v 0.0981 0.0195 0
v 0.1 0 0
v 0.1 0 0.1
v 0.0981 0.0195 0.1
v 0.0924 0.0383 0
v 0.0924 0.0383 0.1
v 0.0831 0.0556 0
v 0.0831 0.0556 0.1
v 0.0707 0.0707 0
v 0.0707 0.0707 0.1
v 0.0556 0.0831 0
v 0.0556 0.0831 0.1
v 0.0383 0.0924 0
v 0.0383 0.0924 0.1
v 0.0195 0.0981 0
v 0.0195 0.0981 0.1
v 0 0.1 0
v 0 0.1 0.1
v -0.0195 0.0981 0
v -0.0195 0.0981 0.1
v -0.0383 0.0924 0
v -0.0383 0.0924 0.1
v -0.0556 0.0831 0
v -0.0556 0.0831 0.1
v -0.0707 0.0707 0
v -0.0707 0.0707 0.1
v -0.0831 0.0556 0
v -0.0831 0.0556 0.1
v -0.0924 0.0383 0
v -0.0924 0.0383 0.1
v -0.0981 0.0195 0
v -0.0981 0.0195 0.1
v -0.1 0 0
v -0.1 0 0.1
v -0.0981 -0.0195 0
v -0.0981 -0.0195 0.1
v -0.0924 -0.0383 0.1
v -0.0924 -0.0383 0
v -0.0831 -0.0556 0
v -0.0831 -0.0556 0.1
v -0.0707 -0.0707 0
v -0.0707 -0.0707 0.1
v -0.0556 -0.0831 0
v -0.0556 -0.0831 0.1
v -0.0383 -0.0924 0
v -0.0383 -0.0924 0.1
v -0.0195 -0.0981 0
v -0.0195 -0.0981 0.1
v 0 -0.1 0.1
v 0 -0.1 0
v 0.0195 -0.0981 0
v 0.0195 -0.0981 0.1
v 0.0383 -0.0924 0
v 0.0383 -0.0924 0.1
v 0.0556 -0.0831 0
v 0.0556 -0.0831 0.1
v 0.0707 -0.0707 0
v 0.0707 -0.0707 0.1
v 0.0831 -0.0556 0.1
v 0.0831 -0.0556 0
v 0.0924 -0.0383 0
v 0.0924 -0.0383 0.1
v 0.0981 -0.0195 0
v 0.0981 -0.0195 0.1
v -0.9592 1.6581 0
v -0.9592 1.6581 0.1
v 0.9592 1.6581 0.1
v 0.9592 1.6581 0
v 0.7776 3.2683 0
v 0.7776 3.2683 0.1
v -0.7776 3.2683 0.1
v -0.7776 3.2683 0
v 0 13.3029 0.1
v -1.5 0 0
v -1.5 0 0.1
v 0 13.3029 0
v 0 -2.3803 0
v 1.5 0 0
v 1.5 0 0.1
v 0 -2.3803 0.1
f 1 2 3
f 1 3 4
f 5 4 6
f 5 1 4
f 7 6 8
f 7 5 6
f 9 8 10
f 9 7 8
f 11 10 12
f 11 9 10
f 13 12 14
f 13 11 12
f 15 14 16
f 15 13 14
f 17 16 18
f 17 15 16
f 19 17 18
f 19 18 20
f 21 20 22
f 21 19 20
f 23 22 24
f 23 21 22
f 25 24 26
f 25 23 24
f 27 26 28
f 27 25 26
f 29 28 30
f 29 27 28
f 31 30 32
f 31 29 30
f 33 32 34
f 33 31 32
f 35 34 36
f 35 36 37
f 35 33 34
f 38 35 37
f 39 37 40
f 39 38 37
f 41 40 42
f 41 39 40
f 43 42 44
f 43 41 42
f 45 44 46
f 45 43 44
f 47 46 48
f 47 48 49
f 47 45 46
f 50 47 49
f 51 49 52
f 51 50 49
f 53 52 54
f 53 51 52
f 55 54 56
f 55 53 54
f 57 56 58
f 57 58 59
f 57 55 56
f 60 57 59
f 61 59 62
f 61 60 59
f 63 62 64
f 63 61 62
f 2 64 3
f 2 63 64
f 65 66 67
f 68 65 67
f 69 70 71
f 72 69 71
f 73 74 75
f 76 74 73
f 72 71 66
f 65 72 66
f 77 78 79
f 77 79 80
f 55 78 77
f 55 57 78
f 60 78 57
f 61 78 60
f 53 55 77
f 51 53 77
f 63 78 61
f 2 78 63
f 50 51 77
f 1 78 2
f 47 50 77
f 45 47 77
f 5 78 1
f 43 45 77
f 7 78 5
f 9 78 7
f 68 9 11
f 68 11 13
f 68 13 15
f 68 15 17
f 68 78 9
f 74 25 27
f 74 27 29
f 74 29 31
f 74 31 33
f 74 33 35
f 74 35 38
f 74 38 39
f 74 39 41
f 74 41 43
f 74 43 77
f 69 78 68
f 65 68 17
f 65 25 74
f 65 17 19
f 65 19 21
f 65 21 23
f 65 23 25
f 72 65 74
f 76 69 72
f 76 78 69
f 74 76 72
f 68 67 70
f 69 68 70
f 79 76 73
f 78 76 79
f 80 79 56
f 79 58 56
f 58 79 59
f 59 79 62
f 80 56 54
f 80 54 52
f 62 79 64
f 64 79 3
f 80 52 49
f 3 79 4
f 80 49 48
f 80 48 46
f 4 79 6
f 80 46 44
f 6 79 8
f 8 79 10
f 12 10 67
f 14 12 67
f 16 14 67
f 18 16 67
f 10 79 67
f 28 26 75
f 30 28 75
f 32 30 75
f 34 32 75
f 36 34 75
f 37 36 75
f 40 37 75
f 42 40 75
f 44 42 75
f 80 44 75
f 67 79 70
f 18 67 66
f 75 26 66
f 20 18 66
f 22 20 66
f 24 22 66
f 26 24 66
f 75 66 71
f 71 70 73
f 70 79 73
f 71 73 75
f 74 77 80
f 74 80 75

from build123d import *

# Parameters (mm, degrees)
SKETCH1_R           = 0.1
BOSS_EXTRUDE1_DEPTH = 0.1
CUT_EXTRUDE1_DEPTH  = 0.1


with BuildPart() as part:
    # Sketch1 → Boss-Extrude1 (new body)
    with BuildSketch(Plane.XY):
        Polygon((0, 13.302859744), (1.5, 0), (0, -2.380255614), (-1.5, 0), align=None)
        Circle(SKETCH1_R, mode=Mode.SUBTRACT)
    extrude(amount=BOSS_EXTRUDE1_DEPTH)

    # Sketch2 → Cut-Extrude1 (cut)
    with BuildSketch(Plane.XY.offset(0.1)):
        Polygon((-0.959190931, 1.658080162), (0.959190931, 1.658080162), (0.777629766, 3.268268638), (-0.777629766, 3.268268638), align=None)
    extrude(amount=-CUT_EXTRUDE1_DEPTH, mode=Mode.SUBTRACT)


solid = part.part
